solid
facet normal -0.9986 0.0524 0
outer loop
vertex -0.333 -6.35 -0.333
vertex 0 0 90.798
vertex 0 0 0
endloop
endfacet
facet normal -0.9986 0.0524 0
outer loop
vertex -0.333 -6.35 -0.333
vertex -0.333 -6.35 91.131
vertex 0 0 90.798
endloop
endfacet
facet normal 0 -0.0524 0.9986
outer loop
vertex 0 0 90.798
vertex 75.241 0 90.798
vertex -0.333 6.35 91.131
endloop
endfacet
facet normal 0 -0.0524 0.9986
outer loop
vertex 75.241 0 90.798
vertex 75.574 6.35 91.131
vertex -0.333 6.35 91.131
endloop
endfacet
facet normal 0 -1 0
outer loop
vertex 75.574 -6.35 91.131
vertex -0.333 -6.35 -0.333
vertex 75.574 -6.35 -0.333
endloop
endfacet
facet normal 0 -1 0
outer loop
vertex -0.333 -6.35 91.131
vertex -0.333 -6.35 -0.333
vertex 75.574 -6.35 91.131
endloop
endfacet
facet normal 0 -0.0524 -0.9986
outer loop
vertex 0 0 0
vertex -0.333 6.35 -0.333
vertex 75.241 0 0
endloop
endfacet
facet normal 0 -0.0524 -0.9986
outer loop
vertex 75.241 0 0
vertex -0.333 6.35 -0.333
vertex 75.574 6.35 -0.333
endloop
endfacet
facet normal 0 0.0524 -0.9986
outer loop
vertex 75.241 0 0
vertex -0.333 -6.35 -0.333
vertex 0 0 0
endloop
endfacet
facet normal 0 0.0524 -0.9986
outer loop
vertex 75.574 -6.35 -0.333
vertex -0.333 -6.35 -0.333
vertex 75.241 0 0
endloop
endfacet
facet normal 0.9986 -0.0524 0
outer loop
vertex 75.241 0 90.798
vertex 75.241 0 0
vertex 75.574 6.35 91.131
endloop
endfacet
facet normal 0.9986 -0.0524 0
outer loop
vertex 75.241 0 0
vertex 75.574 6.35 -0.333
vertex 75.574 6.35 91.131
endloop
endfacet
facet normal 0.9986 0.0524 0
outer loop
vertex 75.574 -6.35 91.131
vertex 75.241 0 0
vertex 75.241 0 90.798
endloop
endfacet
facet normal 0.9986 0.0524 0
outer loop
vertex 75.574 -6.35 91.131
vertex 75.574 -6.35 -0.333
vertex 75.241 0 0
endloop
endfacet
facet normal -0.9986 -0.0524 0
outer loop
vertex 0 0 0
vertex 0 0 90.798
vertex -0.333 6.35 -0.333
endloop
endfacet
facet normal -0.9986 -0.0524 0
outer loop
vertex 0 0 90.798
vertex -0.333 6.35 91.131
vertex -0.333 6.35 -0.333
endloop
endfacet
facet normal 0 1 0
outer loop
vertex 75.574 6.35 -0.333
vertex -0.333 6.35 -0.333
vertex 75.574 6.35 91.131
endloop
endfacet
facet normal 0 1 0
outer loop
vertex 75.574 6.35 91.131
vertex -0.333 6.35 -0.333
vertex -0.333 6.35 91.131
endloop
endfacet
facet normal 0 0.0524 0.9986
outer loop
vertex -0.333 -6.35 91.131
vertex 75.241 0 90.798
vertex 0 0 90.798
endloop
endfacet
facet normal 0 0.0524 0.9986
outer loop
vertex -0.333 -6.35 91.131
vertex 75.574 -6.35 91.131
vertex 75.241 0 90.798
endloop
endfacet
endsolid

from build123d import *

# Parameters (mm, degrees)
F0_W     = 75.2411931753
F0_H     = 90.7979011536
F1_DEPTH = 6.35
F1_TAPER = -3


with BuildPart() as f1:
    # F0 (on Front) → F1 (new body, symmetric)
    with BuildSketch(Plane.XZ):
        with Locations((37.6205965877, 45.3989505768)):
            Rectangle(F0_W, F0_H)
    extrude(amount=F1_DEPTH, both=True, taper=F1_TAPER)


solid = f1.part
